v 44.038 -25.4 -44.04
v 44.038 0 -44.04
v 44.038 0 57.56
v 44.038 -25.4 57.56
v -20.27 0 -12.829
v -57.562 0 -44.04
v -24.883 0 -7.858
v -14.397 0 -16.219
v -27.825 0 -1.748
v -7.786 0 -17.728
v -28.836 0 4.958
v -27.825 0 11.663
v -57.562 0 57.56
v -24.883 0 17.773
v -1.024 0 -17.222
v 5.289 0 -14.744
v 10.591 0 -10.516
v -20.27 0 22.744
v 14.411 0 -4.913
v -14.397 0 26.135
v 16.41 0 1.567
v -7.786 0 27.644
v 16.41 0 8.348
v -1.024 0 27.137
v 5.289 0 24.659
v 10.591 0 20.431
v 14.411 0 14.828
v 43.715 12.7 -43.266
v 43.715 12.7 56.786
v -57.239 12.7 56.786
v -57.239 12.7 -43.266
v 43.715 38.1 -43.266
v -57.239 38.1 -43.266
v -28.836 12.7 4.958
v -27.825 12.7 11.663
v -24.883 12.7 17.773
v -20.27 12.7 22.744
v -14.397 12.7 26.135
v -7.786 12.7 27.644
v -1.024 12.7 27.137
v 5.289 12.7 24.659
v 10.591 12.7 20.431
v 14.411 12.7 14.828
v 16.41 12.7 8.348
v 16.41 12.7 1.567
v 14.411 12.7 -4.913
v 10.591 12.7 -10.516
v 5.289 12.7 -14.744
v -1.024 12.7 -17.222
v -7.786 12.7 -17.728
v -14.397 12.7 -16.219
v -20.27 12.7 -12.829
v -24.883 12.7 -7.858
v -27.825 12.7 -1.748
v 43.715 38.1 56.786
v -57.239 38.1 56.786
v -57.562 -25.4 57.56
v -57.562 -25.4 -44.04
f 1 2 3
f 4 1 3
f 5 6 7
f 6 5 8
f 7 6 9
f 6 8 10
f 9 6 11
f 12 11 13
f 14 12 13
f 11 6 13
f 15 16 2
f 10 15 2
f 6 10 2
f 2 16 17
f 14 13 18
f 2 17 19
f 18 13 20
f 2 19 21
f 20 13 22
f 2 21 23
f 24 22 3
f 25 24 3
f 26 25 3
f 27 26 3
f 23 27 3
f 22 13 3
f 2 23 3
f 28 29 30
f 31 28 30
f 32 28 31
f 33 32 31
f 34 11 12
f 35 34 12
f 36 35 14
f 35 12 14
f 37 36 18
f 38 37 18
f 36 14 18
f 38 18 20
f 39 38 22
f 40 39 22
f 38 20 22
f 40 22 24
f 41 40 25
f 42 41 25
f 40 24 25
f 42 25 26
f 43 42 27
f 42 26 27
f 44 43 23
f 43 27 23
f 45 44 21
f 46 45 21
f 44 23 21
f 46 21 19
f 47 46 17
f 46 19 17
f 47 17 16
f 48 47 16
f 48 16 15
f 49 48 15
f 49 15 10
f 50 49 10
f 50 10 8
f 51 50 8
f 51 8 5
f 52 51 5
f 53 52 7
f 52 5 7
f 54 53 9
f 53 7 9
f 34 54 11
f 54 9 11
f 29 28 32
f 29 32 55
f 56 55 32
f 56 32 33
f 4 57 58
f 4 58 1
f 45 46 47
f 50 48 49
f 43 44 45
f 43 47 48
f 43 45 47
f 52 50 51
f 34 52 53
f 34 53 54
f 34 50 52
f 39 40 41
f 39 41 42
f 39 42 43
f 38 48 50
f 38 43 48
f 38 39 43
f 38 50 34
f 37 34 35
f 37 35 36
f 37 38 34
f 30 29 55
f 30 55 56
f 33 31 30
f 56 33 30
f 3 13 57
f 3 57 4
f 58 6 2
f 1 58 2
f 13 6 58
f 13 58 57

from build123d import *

# Parameters (mm, degrees)
F0_W     = 101.6
F0_H     = 101.6
F1_DEPTH = 25.4
F2_R     = 22.749581
F3_DEPTH = 12.7
F4_W     = 100.953571
F4_H     = 100.0522
F5_DEPTH = 25.4


with BuildPart() as f1:
    # F0 (on Front) → F1 (new body)
    with BuildSketch(Plane.XZ):
        with Locations((-6.761962, 6.760285)):
            Rectangle(F0_W, F0_H)
    extrude(amount=F1_DEPTH)

    # F2 (on face) → F3 (join)
    with BuildSketch(Plane(origin=(0, 0, 0), x_dir=(-1, 0, 0), z_dir=(0, 1, 0))):
        with Locations((6.085932, 4.957542)):
            Circle(F2_R)
    extrude(amount=F3_DEPTH)


with BuildPart() as f5:
    # F4 (on face) → F5 (new body)
    with BuildSketch(Plane(origin=(0, 12.7, 0), x_dir=(-1, 0, 0), z_dir=(0, 1, 0))):
        with Locations((6.761961, 6.760284)):
            Rectangle(F4_W, F4_H)
    extrude(amount=F5_DEPTH)


solid = Compound([f1.part, f5.part])
